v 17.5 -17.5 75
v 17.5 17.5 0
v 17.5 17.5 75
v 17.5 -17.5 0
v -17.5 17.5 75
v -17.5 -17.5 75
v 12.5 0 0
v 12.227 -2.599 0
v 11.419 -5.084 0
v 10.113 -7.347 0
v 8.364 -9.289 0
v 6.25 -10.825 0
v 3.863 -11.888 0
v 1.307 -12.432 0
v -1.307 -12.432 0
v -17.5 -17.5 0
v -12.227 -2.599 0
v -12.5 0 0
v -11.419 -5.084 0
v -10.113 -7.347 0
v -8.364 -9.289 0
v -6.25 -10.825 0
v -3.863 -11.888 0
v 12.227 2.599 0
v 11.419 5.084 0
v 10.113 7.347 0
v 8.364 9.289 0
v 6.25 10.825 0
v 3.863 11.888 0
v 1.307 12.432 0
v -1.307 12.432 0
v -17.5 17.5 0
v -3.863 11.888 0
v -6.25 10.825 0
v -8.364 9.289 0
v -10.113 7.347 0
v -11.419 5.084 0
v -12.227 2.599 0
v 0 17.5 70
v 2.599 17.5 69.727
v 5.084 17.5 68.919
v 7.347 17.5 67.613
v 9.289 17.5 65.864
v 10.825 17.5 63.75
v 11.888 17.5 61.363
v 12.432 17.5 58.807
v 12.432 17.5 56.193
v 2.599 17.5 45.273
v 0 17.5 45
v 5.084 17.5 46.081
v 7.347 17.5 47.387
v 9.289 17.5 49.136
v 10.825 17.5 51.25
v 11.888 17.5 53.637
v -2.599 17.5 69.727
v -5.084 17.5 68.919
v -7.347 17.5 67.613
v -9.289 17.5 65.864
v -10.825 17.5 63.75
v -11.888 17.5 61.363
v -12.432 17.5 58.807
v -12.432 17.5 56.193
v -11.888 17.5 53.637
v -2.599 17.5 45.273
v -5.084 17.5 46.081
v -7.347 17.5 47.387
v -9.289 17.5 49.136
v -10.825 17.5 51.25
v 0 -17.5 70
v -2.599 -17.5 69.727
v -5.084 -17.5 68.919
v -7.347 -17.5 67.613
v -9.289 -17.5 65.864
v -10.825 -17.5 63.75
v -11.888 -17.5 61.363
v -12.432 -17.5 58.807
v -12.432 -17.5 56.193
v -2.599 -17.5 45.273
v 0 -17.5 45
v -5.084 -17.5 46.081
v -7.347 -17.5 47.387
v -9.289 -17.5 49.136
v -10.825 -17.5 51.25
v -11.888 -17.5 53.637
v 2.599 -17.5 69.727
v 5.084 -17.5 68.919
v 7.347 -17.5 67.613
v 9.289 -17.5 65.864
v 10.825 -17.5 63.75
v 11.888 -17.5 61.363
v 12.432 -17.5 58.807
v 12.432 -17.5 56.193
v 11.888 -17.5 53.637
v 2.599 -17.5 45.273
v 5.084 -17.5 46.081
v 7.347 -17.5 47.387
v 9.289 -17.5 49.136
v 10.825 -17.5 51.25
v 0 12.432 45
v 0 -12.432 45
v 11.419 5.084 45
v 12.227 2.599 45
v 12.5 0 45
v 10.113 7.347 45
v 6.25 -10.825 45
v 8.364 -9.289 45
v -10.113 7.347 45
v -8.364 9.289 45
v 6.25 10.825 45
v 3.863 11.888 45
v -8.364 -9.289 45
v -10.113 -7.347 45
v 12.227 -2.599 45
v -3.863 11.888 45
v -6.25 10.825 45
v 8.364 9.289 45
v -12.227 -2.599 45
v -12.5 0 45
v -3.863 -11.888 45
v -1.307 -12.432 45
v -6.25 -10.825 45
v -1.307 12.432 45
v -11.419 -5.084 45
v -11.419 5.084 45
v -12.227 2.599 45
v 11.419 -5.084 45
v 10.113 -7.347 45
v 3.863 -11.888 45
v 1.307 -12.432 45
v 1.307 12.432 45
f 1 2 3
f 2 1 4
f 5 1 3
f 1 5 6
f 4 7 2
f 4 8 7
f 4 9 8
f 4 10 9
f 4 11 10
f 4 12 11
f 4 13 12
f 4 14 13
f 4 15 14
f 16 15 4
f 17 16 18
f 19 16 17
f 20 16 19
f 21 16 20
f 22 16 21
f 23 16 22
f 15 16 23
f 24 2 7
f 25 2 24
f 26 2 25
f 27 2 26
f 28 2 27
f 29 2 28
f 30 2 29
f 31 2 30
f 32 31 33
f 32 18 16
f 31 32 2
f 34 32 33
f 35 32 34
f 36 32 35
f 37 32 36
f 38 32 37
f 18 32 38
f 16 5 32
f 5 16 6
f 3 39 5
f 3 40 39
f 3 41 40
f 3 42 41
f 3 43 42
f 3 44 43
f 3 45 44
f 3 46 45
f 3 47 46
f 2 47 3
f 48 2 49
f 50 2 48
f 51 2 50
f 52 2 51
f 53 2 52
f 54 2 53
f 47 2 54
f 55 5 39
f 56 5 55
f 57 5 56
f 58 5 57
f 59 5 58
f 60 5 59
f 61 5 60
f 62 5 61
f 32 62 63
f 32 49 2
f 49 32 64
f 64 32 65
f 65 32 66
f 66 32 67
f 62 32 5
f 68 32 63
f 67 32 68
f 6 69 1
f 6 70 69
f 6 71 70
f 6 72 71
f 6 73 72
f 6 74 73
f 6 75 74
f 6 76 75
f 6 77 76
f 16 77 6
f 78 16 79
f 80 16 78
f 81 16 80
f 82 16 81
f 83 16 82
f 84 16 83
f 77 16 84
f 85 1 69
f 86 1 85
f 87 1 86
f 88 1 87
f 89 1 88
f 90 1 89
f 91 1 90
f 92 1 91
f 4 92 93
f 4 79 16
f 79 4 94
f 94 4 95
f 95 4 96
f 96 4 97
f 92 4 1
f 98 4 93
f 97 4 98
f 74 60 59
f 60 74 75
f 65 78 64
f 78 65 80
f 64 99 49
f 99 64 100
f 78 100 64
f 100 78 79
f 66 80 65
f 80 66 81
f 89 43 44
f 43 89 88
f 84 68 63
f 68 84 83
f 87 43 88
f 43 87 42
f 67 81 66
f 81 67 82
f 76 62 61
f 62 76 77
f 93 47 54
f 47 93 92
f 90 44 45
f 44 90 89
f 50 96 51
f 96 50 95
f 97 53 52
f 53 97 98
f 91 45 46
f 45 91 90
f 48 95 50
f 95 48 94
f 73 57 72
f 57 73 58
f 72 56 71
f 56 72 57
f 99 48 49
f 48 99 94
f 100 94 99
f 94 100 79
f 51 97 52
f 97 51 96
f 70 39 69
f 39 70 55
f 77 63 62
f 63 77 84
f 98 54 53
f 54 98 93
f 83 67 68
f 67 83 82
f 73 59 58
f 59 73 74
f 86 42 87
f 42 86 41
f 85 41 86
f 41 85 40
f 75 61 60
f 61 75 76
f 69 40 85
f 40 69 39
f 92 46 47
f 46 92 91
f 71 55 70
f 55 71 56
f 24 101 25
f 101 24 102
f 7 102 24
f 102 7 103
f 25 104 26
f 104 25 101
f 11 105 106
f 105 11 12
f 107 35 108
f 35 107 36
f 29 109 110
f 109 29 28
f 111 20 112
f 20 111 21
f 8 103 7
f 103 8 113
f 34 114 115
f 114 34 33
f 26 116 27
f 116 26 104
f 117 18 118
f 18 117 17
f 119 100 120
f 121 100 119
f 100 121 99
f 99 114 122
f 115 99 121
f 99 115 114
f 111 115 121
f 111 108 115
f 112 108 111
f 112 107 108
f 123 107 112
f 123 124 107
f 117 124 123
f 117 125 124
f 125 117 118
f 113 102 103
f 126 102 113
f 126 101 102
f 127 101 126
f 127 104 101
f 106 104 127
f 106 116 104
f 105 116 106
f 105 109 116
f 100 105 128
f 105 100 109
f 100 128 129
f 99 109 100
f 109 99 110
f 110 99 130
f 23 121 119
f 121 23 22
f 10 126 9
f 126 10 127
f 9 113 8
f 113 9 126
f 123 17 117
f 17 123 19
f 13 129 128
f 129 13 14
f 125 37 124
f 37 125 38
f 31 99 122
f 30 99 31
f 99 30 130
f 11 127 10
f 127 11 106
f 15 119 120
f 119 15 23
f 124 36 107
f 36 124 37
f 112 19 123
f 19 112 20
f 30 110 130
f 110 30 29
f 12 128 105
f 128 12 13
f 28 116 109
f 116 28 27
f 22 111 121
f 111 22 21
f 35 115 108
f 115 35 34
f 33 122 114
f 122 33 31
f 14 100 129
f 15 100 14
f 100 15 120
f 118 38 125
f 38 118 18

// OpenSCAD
difference () {
translate([-17.5,-17.5,0])
cube ([35,35,75]);
translate([0,-17.5,57.5])
    rotate([0,90,90])
   cylinder(h=35,r1=12.5,r2=12.5);
    cylinder(h=45,r1=12.5,r2=12.5);
}    
